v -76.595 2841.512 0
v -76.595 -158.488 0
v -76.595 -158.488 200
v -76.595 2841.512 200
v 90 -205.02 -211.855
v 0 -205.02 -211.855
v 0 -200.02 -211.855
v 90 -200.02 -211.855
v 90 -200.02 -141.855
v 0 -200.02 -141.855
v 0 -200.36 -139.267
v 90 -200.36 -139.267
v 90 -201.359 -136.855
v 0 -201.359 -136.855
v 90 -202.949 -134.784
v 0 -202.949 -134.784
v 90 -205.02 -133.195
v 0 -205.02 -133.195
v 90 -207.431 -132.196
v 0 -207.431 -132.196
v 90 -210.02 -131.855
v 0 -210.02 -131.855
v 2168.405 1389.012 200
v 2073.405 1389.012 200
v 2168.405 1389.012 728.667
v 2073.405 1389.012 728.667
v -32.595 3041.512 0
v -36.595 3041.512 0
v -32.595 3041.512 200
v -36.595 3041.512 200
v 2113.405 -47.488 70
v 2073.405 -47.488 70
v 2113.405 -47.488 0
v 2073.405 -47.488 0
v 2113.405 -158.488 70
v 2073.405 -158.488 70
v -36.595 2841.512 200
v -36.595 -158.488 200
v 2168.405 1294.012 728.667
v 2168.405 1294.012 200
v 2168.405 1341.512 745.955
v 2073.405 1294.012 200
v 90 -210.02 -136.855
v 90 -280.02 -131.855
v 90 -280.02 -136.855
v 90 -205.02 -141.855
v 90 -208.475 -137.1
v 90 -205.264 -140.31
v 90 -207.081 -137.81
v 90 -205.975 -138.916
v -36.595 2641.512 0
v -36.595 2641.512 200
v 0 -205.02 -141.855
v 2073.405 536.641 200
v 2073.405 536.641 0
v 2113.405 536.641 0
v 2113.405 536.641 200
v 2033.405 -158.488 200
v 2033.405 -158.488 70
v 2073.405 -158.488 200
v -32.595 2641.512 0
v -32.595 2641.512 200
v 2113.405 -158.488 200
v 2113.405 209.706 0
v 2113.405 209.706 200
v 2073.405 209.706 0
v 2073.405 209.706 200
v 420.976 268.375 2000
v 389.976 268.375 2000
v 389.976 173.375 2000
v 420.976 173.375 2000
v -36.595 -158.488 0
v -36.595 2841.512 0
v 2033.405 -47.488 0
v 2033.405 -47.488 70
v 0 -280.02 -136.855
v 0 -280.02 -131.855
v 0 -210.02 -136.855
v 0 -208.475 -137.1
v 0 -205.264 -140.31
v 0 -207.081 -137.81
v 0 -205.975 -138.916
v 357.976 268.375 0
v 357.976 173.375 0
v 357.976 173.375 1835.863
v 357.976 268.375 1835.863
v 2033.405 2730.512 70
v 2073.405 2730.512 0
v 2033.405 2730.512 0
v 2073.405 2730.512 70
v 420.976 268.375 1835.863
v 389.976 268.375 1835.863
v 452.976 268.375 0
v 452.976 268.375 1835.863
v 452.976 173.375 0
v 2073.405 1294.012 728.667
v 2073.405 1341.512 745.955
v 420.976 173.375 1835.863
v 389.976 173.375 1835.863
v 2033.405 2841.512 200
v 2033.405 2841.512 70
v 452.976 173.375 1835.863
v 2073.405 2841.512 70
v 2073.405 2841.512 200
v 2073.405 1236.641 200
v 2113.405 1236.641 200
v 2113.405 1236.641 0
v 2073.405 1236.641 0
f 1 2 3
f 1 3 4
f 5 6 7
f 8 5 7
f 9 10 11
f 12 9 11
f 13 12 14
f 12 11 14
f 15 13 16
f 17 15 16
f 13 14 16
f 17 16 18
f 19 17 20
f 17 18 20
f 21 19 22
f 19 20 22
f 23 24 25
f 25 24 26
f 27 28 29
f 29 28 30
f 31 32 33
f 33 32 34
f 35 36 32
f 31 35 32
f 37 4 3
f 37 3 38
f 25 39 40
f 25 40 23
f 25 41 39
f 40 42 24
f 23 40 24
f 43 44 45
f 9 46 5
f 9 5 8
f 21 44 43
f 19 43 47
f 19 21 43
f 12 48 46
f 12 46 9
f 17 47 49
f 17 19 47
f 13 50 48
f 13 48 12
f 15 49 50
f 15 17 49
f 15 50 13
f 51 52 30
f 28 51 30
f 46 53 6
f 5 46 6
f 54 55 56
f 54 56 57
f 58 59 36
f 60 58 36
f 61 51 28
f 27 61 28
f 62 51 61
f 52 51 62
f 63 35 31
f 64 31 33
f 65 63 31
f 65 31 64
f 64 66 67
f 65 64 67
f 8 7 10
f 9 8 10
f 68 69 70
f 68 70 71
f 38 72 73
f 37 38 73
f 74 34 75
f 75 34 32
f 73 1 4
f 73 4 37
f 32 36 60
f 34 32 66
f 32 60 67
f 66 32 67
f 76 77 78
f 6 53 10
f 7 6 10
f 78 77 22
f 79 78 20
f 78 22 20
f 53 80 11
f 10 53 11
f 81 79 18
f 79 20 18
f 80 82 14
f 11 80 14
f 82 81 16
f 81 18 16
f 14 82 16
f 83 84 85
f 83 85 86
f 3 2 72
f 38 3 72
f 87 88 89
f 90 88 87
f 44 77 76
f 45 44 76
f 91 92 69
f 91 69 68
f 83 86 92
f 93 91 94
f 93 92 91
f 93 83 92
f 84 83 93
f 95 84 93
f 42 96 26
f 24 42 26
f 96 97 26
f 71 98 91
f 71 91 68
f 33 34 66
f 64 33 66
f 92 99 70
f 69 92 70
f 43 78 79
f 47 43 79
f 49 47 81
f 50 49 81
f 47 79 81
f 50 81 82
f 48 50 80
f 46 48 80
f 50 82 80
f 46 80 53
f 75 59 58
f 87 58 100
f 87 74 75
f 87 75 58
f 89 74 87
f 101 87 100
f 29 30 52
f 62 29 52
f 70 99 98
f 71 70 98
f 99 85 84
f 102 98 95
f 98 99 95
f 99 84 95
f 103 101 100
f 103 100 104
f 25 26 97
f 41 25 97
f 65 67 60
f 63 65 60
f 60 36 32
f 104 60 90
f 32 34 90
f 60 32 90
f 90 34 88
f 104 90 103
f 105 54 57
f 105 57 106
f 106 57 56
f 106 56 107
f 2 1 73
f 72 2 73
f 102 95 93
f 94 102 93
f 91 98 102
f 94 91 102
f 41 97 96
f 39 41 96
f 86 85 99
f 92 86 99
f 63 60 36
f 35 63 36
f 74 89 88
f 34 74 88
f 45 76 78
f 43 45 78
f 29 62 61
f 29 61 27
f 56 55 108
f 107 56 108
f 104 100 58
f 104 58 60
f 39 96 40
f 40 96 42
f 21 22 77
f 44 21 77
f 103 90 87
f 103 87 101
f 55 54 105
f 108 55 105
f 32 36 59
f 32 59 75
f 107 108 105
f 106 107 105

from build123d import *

# Parameters (mm, degrees)
F2_W      = 40
F2_H      = 3000
F3_DEPTH  = 200
F2_W_2    = 95
F2_H_2    = 95
F4_DEPTH  = 2000
F5_W      = 32
F5_H      = 164.1365289688
F6_DEPTH  = 2668.13823376
F8_DEPTH  = 90
F9_W      = 200
F9_H      = 200
F10_DEPTH = 4
F12_W     = 111
F12_H     = 70
F13_DEPTH = 2150.001
F15_DEPTH = 40
F14_W     = 700
F14_H     = 200
F16_DEPTH = 95


with BuildPart() as f3:
    # F2 (on Top) → F3 (new body)
    with BuildSketch(Plane.XY):
        with Locations((-56.5951354802, 1341.5122591515)):
            Rectangle(F2_W, F2_H)
    extrude(amount=F3_DEPTH)


with BuildPart() as f4:
    # F2 (on Top) → F4 (new body)
    with BuildSketch(Plane.XY):
        with Locations((405.4758989811, 220.8750253916)):
            Rectangle(F2_W_2, F2_H_2)
    extrude(amount=F4_DEPTH)

    # F5 (on face) → F6 (cut, through all)
    with BuildSketch(Plane.XZ.offset(-173.3750253916)):
        with Locations((373.9758989811, 1917.9317355156)):
            Rectangle(F5_W, F5_H)
        with Locations((436.9758989811, 1917.9317355156)):
            Rectangle(F5_W, F5_H)
    extrude(amount=-F6_DEPTH, mode=Mode.SUBTRACT)


with BuildPart() as f8:
    # F7 (on Right) → F8 (new body)
    with BuildSketch(Plane.YZ):
        with BuildLine():
            Line((-210.0196278095, -131.8551599979), (-280.0196278095, -131.8551599979))
            Line((-280.0196278095, -131.8551599979), (-280.0196278095, -136.8551599979))
            Line((-280.0196278095, -136.8551599979), (-210.0196278095, -136.8551599979))
            ThreePointArc((-210.0196278095, -136.8551599979), (-206.4840939036, -138.319626092), (-205.0196278095, -141.8551599979))
            Line((-205.0196278095, -141.8551599979), (-205.0196278095, -211.8551599979))
            Line((-205.0196278095, -211.8551599979), (-200.0196278095, -211.8551599979))
            Line((-200.0196278095, -211.8551599979), (-200.0196278095, -141.8551599979))
            ThreePointArc((-200.0196278095, -141.8551599979), (-202.9485599977, -134.7840921861), (-210.0196278095, -131.8551599979))
        make_face()
    extrude(amount=F8_DEPTH)


with BuildPart() as f10:
    # F9 (on face) → F10 (new body)
    with BuildSketch(Plane.YZ.offset(-36.5951354802)):
        with Locations((2741.5122591515, 100)):
            Rectangle(F9_W, F9_H)
        with Locations((2941.5122591515, 100)):
            Rectangle(F9_W, F9_H)
    extrude(amount=F10_DEPTH)


with BuildPart() as f11_1:
    # F11: copy of F3
    add(f3.part.moved(Location((2110, 0, 0))))

    # F12 (on face) → F13 (cut, through all)
    with BuildSketch(Plane.YZ.offset(2073.4048645198)):
        with Locations((-102.9877408485, 35)):
            Rectangle(F12_W, F12_H)
        with Locations((2786.0122591515, 35)):
            Rectangle(F12_W, F12_H)
    extrude(amount=-F13_DEPTH, mode=Mode.SUBTRACT)


with BuildPart() as f15:
    # F14 (on face) → F15 (new body)
    with BuildSketch(Plane.YZ.offset(2073.4048645198)):
        Polygon((209.7060382366, 200), (-158.4877408485, 200), (-158.4877408485, 186.4807903767), (-158.4877408485, 70), (-47.4877408485, 70), (-47.4877408485, 0), (209.7060382366, 0), align=None)
    extrude(amount=F15_DEPTH)


with BuildPart() as f15b:
    # F14 (on face) → F15, piece 2 (new body)
    with BuildSketch(Plane.YZ.offset(2073.4048645198)):
        with Locations((886.6408228874, 100)):
            Rectangle(F14_W, F14_H)
    extrude(amount=F15_DEPTH)


with BuildPart() as f16:
    # F12 (on face) → F16 (new body)
    with BuildSketch(Plane.YZ.offset(2073.4048645198)):
        Polygon((1294.0122591515, 728.6667652717), (1294.0122591515, 200), (1389.0122591515, 200), (1389.0122591515, 728.6667652717), (1341.5122591515, 745.9553513993), align=None)
    extrude(amount=F16_DEPTH)


solid = Compound([f3.part, f4.part, f8.part, f10.part, f11_1.part, f15.part, f15b.part, f16.part])
